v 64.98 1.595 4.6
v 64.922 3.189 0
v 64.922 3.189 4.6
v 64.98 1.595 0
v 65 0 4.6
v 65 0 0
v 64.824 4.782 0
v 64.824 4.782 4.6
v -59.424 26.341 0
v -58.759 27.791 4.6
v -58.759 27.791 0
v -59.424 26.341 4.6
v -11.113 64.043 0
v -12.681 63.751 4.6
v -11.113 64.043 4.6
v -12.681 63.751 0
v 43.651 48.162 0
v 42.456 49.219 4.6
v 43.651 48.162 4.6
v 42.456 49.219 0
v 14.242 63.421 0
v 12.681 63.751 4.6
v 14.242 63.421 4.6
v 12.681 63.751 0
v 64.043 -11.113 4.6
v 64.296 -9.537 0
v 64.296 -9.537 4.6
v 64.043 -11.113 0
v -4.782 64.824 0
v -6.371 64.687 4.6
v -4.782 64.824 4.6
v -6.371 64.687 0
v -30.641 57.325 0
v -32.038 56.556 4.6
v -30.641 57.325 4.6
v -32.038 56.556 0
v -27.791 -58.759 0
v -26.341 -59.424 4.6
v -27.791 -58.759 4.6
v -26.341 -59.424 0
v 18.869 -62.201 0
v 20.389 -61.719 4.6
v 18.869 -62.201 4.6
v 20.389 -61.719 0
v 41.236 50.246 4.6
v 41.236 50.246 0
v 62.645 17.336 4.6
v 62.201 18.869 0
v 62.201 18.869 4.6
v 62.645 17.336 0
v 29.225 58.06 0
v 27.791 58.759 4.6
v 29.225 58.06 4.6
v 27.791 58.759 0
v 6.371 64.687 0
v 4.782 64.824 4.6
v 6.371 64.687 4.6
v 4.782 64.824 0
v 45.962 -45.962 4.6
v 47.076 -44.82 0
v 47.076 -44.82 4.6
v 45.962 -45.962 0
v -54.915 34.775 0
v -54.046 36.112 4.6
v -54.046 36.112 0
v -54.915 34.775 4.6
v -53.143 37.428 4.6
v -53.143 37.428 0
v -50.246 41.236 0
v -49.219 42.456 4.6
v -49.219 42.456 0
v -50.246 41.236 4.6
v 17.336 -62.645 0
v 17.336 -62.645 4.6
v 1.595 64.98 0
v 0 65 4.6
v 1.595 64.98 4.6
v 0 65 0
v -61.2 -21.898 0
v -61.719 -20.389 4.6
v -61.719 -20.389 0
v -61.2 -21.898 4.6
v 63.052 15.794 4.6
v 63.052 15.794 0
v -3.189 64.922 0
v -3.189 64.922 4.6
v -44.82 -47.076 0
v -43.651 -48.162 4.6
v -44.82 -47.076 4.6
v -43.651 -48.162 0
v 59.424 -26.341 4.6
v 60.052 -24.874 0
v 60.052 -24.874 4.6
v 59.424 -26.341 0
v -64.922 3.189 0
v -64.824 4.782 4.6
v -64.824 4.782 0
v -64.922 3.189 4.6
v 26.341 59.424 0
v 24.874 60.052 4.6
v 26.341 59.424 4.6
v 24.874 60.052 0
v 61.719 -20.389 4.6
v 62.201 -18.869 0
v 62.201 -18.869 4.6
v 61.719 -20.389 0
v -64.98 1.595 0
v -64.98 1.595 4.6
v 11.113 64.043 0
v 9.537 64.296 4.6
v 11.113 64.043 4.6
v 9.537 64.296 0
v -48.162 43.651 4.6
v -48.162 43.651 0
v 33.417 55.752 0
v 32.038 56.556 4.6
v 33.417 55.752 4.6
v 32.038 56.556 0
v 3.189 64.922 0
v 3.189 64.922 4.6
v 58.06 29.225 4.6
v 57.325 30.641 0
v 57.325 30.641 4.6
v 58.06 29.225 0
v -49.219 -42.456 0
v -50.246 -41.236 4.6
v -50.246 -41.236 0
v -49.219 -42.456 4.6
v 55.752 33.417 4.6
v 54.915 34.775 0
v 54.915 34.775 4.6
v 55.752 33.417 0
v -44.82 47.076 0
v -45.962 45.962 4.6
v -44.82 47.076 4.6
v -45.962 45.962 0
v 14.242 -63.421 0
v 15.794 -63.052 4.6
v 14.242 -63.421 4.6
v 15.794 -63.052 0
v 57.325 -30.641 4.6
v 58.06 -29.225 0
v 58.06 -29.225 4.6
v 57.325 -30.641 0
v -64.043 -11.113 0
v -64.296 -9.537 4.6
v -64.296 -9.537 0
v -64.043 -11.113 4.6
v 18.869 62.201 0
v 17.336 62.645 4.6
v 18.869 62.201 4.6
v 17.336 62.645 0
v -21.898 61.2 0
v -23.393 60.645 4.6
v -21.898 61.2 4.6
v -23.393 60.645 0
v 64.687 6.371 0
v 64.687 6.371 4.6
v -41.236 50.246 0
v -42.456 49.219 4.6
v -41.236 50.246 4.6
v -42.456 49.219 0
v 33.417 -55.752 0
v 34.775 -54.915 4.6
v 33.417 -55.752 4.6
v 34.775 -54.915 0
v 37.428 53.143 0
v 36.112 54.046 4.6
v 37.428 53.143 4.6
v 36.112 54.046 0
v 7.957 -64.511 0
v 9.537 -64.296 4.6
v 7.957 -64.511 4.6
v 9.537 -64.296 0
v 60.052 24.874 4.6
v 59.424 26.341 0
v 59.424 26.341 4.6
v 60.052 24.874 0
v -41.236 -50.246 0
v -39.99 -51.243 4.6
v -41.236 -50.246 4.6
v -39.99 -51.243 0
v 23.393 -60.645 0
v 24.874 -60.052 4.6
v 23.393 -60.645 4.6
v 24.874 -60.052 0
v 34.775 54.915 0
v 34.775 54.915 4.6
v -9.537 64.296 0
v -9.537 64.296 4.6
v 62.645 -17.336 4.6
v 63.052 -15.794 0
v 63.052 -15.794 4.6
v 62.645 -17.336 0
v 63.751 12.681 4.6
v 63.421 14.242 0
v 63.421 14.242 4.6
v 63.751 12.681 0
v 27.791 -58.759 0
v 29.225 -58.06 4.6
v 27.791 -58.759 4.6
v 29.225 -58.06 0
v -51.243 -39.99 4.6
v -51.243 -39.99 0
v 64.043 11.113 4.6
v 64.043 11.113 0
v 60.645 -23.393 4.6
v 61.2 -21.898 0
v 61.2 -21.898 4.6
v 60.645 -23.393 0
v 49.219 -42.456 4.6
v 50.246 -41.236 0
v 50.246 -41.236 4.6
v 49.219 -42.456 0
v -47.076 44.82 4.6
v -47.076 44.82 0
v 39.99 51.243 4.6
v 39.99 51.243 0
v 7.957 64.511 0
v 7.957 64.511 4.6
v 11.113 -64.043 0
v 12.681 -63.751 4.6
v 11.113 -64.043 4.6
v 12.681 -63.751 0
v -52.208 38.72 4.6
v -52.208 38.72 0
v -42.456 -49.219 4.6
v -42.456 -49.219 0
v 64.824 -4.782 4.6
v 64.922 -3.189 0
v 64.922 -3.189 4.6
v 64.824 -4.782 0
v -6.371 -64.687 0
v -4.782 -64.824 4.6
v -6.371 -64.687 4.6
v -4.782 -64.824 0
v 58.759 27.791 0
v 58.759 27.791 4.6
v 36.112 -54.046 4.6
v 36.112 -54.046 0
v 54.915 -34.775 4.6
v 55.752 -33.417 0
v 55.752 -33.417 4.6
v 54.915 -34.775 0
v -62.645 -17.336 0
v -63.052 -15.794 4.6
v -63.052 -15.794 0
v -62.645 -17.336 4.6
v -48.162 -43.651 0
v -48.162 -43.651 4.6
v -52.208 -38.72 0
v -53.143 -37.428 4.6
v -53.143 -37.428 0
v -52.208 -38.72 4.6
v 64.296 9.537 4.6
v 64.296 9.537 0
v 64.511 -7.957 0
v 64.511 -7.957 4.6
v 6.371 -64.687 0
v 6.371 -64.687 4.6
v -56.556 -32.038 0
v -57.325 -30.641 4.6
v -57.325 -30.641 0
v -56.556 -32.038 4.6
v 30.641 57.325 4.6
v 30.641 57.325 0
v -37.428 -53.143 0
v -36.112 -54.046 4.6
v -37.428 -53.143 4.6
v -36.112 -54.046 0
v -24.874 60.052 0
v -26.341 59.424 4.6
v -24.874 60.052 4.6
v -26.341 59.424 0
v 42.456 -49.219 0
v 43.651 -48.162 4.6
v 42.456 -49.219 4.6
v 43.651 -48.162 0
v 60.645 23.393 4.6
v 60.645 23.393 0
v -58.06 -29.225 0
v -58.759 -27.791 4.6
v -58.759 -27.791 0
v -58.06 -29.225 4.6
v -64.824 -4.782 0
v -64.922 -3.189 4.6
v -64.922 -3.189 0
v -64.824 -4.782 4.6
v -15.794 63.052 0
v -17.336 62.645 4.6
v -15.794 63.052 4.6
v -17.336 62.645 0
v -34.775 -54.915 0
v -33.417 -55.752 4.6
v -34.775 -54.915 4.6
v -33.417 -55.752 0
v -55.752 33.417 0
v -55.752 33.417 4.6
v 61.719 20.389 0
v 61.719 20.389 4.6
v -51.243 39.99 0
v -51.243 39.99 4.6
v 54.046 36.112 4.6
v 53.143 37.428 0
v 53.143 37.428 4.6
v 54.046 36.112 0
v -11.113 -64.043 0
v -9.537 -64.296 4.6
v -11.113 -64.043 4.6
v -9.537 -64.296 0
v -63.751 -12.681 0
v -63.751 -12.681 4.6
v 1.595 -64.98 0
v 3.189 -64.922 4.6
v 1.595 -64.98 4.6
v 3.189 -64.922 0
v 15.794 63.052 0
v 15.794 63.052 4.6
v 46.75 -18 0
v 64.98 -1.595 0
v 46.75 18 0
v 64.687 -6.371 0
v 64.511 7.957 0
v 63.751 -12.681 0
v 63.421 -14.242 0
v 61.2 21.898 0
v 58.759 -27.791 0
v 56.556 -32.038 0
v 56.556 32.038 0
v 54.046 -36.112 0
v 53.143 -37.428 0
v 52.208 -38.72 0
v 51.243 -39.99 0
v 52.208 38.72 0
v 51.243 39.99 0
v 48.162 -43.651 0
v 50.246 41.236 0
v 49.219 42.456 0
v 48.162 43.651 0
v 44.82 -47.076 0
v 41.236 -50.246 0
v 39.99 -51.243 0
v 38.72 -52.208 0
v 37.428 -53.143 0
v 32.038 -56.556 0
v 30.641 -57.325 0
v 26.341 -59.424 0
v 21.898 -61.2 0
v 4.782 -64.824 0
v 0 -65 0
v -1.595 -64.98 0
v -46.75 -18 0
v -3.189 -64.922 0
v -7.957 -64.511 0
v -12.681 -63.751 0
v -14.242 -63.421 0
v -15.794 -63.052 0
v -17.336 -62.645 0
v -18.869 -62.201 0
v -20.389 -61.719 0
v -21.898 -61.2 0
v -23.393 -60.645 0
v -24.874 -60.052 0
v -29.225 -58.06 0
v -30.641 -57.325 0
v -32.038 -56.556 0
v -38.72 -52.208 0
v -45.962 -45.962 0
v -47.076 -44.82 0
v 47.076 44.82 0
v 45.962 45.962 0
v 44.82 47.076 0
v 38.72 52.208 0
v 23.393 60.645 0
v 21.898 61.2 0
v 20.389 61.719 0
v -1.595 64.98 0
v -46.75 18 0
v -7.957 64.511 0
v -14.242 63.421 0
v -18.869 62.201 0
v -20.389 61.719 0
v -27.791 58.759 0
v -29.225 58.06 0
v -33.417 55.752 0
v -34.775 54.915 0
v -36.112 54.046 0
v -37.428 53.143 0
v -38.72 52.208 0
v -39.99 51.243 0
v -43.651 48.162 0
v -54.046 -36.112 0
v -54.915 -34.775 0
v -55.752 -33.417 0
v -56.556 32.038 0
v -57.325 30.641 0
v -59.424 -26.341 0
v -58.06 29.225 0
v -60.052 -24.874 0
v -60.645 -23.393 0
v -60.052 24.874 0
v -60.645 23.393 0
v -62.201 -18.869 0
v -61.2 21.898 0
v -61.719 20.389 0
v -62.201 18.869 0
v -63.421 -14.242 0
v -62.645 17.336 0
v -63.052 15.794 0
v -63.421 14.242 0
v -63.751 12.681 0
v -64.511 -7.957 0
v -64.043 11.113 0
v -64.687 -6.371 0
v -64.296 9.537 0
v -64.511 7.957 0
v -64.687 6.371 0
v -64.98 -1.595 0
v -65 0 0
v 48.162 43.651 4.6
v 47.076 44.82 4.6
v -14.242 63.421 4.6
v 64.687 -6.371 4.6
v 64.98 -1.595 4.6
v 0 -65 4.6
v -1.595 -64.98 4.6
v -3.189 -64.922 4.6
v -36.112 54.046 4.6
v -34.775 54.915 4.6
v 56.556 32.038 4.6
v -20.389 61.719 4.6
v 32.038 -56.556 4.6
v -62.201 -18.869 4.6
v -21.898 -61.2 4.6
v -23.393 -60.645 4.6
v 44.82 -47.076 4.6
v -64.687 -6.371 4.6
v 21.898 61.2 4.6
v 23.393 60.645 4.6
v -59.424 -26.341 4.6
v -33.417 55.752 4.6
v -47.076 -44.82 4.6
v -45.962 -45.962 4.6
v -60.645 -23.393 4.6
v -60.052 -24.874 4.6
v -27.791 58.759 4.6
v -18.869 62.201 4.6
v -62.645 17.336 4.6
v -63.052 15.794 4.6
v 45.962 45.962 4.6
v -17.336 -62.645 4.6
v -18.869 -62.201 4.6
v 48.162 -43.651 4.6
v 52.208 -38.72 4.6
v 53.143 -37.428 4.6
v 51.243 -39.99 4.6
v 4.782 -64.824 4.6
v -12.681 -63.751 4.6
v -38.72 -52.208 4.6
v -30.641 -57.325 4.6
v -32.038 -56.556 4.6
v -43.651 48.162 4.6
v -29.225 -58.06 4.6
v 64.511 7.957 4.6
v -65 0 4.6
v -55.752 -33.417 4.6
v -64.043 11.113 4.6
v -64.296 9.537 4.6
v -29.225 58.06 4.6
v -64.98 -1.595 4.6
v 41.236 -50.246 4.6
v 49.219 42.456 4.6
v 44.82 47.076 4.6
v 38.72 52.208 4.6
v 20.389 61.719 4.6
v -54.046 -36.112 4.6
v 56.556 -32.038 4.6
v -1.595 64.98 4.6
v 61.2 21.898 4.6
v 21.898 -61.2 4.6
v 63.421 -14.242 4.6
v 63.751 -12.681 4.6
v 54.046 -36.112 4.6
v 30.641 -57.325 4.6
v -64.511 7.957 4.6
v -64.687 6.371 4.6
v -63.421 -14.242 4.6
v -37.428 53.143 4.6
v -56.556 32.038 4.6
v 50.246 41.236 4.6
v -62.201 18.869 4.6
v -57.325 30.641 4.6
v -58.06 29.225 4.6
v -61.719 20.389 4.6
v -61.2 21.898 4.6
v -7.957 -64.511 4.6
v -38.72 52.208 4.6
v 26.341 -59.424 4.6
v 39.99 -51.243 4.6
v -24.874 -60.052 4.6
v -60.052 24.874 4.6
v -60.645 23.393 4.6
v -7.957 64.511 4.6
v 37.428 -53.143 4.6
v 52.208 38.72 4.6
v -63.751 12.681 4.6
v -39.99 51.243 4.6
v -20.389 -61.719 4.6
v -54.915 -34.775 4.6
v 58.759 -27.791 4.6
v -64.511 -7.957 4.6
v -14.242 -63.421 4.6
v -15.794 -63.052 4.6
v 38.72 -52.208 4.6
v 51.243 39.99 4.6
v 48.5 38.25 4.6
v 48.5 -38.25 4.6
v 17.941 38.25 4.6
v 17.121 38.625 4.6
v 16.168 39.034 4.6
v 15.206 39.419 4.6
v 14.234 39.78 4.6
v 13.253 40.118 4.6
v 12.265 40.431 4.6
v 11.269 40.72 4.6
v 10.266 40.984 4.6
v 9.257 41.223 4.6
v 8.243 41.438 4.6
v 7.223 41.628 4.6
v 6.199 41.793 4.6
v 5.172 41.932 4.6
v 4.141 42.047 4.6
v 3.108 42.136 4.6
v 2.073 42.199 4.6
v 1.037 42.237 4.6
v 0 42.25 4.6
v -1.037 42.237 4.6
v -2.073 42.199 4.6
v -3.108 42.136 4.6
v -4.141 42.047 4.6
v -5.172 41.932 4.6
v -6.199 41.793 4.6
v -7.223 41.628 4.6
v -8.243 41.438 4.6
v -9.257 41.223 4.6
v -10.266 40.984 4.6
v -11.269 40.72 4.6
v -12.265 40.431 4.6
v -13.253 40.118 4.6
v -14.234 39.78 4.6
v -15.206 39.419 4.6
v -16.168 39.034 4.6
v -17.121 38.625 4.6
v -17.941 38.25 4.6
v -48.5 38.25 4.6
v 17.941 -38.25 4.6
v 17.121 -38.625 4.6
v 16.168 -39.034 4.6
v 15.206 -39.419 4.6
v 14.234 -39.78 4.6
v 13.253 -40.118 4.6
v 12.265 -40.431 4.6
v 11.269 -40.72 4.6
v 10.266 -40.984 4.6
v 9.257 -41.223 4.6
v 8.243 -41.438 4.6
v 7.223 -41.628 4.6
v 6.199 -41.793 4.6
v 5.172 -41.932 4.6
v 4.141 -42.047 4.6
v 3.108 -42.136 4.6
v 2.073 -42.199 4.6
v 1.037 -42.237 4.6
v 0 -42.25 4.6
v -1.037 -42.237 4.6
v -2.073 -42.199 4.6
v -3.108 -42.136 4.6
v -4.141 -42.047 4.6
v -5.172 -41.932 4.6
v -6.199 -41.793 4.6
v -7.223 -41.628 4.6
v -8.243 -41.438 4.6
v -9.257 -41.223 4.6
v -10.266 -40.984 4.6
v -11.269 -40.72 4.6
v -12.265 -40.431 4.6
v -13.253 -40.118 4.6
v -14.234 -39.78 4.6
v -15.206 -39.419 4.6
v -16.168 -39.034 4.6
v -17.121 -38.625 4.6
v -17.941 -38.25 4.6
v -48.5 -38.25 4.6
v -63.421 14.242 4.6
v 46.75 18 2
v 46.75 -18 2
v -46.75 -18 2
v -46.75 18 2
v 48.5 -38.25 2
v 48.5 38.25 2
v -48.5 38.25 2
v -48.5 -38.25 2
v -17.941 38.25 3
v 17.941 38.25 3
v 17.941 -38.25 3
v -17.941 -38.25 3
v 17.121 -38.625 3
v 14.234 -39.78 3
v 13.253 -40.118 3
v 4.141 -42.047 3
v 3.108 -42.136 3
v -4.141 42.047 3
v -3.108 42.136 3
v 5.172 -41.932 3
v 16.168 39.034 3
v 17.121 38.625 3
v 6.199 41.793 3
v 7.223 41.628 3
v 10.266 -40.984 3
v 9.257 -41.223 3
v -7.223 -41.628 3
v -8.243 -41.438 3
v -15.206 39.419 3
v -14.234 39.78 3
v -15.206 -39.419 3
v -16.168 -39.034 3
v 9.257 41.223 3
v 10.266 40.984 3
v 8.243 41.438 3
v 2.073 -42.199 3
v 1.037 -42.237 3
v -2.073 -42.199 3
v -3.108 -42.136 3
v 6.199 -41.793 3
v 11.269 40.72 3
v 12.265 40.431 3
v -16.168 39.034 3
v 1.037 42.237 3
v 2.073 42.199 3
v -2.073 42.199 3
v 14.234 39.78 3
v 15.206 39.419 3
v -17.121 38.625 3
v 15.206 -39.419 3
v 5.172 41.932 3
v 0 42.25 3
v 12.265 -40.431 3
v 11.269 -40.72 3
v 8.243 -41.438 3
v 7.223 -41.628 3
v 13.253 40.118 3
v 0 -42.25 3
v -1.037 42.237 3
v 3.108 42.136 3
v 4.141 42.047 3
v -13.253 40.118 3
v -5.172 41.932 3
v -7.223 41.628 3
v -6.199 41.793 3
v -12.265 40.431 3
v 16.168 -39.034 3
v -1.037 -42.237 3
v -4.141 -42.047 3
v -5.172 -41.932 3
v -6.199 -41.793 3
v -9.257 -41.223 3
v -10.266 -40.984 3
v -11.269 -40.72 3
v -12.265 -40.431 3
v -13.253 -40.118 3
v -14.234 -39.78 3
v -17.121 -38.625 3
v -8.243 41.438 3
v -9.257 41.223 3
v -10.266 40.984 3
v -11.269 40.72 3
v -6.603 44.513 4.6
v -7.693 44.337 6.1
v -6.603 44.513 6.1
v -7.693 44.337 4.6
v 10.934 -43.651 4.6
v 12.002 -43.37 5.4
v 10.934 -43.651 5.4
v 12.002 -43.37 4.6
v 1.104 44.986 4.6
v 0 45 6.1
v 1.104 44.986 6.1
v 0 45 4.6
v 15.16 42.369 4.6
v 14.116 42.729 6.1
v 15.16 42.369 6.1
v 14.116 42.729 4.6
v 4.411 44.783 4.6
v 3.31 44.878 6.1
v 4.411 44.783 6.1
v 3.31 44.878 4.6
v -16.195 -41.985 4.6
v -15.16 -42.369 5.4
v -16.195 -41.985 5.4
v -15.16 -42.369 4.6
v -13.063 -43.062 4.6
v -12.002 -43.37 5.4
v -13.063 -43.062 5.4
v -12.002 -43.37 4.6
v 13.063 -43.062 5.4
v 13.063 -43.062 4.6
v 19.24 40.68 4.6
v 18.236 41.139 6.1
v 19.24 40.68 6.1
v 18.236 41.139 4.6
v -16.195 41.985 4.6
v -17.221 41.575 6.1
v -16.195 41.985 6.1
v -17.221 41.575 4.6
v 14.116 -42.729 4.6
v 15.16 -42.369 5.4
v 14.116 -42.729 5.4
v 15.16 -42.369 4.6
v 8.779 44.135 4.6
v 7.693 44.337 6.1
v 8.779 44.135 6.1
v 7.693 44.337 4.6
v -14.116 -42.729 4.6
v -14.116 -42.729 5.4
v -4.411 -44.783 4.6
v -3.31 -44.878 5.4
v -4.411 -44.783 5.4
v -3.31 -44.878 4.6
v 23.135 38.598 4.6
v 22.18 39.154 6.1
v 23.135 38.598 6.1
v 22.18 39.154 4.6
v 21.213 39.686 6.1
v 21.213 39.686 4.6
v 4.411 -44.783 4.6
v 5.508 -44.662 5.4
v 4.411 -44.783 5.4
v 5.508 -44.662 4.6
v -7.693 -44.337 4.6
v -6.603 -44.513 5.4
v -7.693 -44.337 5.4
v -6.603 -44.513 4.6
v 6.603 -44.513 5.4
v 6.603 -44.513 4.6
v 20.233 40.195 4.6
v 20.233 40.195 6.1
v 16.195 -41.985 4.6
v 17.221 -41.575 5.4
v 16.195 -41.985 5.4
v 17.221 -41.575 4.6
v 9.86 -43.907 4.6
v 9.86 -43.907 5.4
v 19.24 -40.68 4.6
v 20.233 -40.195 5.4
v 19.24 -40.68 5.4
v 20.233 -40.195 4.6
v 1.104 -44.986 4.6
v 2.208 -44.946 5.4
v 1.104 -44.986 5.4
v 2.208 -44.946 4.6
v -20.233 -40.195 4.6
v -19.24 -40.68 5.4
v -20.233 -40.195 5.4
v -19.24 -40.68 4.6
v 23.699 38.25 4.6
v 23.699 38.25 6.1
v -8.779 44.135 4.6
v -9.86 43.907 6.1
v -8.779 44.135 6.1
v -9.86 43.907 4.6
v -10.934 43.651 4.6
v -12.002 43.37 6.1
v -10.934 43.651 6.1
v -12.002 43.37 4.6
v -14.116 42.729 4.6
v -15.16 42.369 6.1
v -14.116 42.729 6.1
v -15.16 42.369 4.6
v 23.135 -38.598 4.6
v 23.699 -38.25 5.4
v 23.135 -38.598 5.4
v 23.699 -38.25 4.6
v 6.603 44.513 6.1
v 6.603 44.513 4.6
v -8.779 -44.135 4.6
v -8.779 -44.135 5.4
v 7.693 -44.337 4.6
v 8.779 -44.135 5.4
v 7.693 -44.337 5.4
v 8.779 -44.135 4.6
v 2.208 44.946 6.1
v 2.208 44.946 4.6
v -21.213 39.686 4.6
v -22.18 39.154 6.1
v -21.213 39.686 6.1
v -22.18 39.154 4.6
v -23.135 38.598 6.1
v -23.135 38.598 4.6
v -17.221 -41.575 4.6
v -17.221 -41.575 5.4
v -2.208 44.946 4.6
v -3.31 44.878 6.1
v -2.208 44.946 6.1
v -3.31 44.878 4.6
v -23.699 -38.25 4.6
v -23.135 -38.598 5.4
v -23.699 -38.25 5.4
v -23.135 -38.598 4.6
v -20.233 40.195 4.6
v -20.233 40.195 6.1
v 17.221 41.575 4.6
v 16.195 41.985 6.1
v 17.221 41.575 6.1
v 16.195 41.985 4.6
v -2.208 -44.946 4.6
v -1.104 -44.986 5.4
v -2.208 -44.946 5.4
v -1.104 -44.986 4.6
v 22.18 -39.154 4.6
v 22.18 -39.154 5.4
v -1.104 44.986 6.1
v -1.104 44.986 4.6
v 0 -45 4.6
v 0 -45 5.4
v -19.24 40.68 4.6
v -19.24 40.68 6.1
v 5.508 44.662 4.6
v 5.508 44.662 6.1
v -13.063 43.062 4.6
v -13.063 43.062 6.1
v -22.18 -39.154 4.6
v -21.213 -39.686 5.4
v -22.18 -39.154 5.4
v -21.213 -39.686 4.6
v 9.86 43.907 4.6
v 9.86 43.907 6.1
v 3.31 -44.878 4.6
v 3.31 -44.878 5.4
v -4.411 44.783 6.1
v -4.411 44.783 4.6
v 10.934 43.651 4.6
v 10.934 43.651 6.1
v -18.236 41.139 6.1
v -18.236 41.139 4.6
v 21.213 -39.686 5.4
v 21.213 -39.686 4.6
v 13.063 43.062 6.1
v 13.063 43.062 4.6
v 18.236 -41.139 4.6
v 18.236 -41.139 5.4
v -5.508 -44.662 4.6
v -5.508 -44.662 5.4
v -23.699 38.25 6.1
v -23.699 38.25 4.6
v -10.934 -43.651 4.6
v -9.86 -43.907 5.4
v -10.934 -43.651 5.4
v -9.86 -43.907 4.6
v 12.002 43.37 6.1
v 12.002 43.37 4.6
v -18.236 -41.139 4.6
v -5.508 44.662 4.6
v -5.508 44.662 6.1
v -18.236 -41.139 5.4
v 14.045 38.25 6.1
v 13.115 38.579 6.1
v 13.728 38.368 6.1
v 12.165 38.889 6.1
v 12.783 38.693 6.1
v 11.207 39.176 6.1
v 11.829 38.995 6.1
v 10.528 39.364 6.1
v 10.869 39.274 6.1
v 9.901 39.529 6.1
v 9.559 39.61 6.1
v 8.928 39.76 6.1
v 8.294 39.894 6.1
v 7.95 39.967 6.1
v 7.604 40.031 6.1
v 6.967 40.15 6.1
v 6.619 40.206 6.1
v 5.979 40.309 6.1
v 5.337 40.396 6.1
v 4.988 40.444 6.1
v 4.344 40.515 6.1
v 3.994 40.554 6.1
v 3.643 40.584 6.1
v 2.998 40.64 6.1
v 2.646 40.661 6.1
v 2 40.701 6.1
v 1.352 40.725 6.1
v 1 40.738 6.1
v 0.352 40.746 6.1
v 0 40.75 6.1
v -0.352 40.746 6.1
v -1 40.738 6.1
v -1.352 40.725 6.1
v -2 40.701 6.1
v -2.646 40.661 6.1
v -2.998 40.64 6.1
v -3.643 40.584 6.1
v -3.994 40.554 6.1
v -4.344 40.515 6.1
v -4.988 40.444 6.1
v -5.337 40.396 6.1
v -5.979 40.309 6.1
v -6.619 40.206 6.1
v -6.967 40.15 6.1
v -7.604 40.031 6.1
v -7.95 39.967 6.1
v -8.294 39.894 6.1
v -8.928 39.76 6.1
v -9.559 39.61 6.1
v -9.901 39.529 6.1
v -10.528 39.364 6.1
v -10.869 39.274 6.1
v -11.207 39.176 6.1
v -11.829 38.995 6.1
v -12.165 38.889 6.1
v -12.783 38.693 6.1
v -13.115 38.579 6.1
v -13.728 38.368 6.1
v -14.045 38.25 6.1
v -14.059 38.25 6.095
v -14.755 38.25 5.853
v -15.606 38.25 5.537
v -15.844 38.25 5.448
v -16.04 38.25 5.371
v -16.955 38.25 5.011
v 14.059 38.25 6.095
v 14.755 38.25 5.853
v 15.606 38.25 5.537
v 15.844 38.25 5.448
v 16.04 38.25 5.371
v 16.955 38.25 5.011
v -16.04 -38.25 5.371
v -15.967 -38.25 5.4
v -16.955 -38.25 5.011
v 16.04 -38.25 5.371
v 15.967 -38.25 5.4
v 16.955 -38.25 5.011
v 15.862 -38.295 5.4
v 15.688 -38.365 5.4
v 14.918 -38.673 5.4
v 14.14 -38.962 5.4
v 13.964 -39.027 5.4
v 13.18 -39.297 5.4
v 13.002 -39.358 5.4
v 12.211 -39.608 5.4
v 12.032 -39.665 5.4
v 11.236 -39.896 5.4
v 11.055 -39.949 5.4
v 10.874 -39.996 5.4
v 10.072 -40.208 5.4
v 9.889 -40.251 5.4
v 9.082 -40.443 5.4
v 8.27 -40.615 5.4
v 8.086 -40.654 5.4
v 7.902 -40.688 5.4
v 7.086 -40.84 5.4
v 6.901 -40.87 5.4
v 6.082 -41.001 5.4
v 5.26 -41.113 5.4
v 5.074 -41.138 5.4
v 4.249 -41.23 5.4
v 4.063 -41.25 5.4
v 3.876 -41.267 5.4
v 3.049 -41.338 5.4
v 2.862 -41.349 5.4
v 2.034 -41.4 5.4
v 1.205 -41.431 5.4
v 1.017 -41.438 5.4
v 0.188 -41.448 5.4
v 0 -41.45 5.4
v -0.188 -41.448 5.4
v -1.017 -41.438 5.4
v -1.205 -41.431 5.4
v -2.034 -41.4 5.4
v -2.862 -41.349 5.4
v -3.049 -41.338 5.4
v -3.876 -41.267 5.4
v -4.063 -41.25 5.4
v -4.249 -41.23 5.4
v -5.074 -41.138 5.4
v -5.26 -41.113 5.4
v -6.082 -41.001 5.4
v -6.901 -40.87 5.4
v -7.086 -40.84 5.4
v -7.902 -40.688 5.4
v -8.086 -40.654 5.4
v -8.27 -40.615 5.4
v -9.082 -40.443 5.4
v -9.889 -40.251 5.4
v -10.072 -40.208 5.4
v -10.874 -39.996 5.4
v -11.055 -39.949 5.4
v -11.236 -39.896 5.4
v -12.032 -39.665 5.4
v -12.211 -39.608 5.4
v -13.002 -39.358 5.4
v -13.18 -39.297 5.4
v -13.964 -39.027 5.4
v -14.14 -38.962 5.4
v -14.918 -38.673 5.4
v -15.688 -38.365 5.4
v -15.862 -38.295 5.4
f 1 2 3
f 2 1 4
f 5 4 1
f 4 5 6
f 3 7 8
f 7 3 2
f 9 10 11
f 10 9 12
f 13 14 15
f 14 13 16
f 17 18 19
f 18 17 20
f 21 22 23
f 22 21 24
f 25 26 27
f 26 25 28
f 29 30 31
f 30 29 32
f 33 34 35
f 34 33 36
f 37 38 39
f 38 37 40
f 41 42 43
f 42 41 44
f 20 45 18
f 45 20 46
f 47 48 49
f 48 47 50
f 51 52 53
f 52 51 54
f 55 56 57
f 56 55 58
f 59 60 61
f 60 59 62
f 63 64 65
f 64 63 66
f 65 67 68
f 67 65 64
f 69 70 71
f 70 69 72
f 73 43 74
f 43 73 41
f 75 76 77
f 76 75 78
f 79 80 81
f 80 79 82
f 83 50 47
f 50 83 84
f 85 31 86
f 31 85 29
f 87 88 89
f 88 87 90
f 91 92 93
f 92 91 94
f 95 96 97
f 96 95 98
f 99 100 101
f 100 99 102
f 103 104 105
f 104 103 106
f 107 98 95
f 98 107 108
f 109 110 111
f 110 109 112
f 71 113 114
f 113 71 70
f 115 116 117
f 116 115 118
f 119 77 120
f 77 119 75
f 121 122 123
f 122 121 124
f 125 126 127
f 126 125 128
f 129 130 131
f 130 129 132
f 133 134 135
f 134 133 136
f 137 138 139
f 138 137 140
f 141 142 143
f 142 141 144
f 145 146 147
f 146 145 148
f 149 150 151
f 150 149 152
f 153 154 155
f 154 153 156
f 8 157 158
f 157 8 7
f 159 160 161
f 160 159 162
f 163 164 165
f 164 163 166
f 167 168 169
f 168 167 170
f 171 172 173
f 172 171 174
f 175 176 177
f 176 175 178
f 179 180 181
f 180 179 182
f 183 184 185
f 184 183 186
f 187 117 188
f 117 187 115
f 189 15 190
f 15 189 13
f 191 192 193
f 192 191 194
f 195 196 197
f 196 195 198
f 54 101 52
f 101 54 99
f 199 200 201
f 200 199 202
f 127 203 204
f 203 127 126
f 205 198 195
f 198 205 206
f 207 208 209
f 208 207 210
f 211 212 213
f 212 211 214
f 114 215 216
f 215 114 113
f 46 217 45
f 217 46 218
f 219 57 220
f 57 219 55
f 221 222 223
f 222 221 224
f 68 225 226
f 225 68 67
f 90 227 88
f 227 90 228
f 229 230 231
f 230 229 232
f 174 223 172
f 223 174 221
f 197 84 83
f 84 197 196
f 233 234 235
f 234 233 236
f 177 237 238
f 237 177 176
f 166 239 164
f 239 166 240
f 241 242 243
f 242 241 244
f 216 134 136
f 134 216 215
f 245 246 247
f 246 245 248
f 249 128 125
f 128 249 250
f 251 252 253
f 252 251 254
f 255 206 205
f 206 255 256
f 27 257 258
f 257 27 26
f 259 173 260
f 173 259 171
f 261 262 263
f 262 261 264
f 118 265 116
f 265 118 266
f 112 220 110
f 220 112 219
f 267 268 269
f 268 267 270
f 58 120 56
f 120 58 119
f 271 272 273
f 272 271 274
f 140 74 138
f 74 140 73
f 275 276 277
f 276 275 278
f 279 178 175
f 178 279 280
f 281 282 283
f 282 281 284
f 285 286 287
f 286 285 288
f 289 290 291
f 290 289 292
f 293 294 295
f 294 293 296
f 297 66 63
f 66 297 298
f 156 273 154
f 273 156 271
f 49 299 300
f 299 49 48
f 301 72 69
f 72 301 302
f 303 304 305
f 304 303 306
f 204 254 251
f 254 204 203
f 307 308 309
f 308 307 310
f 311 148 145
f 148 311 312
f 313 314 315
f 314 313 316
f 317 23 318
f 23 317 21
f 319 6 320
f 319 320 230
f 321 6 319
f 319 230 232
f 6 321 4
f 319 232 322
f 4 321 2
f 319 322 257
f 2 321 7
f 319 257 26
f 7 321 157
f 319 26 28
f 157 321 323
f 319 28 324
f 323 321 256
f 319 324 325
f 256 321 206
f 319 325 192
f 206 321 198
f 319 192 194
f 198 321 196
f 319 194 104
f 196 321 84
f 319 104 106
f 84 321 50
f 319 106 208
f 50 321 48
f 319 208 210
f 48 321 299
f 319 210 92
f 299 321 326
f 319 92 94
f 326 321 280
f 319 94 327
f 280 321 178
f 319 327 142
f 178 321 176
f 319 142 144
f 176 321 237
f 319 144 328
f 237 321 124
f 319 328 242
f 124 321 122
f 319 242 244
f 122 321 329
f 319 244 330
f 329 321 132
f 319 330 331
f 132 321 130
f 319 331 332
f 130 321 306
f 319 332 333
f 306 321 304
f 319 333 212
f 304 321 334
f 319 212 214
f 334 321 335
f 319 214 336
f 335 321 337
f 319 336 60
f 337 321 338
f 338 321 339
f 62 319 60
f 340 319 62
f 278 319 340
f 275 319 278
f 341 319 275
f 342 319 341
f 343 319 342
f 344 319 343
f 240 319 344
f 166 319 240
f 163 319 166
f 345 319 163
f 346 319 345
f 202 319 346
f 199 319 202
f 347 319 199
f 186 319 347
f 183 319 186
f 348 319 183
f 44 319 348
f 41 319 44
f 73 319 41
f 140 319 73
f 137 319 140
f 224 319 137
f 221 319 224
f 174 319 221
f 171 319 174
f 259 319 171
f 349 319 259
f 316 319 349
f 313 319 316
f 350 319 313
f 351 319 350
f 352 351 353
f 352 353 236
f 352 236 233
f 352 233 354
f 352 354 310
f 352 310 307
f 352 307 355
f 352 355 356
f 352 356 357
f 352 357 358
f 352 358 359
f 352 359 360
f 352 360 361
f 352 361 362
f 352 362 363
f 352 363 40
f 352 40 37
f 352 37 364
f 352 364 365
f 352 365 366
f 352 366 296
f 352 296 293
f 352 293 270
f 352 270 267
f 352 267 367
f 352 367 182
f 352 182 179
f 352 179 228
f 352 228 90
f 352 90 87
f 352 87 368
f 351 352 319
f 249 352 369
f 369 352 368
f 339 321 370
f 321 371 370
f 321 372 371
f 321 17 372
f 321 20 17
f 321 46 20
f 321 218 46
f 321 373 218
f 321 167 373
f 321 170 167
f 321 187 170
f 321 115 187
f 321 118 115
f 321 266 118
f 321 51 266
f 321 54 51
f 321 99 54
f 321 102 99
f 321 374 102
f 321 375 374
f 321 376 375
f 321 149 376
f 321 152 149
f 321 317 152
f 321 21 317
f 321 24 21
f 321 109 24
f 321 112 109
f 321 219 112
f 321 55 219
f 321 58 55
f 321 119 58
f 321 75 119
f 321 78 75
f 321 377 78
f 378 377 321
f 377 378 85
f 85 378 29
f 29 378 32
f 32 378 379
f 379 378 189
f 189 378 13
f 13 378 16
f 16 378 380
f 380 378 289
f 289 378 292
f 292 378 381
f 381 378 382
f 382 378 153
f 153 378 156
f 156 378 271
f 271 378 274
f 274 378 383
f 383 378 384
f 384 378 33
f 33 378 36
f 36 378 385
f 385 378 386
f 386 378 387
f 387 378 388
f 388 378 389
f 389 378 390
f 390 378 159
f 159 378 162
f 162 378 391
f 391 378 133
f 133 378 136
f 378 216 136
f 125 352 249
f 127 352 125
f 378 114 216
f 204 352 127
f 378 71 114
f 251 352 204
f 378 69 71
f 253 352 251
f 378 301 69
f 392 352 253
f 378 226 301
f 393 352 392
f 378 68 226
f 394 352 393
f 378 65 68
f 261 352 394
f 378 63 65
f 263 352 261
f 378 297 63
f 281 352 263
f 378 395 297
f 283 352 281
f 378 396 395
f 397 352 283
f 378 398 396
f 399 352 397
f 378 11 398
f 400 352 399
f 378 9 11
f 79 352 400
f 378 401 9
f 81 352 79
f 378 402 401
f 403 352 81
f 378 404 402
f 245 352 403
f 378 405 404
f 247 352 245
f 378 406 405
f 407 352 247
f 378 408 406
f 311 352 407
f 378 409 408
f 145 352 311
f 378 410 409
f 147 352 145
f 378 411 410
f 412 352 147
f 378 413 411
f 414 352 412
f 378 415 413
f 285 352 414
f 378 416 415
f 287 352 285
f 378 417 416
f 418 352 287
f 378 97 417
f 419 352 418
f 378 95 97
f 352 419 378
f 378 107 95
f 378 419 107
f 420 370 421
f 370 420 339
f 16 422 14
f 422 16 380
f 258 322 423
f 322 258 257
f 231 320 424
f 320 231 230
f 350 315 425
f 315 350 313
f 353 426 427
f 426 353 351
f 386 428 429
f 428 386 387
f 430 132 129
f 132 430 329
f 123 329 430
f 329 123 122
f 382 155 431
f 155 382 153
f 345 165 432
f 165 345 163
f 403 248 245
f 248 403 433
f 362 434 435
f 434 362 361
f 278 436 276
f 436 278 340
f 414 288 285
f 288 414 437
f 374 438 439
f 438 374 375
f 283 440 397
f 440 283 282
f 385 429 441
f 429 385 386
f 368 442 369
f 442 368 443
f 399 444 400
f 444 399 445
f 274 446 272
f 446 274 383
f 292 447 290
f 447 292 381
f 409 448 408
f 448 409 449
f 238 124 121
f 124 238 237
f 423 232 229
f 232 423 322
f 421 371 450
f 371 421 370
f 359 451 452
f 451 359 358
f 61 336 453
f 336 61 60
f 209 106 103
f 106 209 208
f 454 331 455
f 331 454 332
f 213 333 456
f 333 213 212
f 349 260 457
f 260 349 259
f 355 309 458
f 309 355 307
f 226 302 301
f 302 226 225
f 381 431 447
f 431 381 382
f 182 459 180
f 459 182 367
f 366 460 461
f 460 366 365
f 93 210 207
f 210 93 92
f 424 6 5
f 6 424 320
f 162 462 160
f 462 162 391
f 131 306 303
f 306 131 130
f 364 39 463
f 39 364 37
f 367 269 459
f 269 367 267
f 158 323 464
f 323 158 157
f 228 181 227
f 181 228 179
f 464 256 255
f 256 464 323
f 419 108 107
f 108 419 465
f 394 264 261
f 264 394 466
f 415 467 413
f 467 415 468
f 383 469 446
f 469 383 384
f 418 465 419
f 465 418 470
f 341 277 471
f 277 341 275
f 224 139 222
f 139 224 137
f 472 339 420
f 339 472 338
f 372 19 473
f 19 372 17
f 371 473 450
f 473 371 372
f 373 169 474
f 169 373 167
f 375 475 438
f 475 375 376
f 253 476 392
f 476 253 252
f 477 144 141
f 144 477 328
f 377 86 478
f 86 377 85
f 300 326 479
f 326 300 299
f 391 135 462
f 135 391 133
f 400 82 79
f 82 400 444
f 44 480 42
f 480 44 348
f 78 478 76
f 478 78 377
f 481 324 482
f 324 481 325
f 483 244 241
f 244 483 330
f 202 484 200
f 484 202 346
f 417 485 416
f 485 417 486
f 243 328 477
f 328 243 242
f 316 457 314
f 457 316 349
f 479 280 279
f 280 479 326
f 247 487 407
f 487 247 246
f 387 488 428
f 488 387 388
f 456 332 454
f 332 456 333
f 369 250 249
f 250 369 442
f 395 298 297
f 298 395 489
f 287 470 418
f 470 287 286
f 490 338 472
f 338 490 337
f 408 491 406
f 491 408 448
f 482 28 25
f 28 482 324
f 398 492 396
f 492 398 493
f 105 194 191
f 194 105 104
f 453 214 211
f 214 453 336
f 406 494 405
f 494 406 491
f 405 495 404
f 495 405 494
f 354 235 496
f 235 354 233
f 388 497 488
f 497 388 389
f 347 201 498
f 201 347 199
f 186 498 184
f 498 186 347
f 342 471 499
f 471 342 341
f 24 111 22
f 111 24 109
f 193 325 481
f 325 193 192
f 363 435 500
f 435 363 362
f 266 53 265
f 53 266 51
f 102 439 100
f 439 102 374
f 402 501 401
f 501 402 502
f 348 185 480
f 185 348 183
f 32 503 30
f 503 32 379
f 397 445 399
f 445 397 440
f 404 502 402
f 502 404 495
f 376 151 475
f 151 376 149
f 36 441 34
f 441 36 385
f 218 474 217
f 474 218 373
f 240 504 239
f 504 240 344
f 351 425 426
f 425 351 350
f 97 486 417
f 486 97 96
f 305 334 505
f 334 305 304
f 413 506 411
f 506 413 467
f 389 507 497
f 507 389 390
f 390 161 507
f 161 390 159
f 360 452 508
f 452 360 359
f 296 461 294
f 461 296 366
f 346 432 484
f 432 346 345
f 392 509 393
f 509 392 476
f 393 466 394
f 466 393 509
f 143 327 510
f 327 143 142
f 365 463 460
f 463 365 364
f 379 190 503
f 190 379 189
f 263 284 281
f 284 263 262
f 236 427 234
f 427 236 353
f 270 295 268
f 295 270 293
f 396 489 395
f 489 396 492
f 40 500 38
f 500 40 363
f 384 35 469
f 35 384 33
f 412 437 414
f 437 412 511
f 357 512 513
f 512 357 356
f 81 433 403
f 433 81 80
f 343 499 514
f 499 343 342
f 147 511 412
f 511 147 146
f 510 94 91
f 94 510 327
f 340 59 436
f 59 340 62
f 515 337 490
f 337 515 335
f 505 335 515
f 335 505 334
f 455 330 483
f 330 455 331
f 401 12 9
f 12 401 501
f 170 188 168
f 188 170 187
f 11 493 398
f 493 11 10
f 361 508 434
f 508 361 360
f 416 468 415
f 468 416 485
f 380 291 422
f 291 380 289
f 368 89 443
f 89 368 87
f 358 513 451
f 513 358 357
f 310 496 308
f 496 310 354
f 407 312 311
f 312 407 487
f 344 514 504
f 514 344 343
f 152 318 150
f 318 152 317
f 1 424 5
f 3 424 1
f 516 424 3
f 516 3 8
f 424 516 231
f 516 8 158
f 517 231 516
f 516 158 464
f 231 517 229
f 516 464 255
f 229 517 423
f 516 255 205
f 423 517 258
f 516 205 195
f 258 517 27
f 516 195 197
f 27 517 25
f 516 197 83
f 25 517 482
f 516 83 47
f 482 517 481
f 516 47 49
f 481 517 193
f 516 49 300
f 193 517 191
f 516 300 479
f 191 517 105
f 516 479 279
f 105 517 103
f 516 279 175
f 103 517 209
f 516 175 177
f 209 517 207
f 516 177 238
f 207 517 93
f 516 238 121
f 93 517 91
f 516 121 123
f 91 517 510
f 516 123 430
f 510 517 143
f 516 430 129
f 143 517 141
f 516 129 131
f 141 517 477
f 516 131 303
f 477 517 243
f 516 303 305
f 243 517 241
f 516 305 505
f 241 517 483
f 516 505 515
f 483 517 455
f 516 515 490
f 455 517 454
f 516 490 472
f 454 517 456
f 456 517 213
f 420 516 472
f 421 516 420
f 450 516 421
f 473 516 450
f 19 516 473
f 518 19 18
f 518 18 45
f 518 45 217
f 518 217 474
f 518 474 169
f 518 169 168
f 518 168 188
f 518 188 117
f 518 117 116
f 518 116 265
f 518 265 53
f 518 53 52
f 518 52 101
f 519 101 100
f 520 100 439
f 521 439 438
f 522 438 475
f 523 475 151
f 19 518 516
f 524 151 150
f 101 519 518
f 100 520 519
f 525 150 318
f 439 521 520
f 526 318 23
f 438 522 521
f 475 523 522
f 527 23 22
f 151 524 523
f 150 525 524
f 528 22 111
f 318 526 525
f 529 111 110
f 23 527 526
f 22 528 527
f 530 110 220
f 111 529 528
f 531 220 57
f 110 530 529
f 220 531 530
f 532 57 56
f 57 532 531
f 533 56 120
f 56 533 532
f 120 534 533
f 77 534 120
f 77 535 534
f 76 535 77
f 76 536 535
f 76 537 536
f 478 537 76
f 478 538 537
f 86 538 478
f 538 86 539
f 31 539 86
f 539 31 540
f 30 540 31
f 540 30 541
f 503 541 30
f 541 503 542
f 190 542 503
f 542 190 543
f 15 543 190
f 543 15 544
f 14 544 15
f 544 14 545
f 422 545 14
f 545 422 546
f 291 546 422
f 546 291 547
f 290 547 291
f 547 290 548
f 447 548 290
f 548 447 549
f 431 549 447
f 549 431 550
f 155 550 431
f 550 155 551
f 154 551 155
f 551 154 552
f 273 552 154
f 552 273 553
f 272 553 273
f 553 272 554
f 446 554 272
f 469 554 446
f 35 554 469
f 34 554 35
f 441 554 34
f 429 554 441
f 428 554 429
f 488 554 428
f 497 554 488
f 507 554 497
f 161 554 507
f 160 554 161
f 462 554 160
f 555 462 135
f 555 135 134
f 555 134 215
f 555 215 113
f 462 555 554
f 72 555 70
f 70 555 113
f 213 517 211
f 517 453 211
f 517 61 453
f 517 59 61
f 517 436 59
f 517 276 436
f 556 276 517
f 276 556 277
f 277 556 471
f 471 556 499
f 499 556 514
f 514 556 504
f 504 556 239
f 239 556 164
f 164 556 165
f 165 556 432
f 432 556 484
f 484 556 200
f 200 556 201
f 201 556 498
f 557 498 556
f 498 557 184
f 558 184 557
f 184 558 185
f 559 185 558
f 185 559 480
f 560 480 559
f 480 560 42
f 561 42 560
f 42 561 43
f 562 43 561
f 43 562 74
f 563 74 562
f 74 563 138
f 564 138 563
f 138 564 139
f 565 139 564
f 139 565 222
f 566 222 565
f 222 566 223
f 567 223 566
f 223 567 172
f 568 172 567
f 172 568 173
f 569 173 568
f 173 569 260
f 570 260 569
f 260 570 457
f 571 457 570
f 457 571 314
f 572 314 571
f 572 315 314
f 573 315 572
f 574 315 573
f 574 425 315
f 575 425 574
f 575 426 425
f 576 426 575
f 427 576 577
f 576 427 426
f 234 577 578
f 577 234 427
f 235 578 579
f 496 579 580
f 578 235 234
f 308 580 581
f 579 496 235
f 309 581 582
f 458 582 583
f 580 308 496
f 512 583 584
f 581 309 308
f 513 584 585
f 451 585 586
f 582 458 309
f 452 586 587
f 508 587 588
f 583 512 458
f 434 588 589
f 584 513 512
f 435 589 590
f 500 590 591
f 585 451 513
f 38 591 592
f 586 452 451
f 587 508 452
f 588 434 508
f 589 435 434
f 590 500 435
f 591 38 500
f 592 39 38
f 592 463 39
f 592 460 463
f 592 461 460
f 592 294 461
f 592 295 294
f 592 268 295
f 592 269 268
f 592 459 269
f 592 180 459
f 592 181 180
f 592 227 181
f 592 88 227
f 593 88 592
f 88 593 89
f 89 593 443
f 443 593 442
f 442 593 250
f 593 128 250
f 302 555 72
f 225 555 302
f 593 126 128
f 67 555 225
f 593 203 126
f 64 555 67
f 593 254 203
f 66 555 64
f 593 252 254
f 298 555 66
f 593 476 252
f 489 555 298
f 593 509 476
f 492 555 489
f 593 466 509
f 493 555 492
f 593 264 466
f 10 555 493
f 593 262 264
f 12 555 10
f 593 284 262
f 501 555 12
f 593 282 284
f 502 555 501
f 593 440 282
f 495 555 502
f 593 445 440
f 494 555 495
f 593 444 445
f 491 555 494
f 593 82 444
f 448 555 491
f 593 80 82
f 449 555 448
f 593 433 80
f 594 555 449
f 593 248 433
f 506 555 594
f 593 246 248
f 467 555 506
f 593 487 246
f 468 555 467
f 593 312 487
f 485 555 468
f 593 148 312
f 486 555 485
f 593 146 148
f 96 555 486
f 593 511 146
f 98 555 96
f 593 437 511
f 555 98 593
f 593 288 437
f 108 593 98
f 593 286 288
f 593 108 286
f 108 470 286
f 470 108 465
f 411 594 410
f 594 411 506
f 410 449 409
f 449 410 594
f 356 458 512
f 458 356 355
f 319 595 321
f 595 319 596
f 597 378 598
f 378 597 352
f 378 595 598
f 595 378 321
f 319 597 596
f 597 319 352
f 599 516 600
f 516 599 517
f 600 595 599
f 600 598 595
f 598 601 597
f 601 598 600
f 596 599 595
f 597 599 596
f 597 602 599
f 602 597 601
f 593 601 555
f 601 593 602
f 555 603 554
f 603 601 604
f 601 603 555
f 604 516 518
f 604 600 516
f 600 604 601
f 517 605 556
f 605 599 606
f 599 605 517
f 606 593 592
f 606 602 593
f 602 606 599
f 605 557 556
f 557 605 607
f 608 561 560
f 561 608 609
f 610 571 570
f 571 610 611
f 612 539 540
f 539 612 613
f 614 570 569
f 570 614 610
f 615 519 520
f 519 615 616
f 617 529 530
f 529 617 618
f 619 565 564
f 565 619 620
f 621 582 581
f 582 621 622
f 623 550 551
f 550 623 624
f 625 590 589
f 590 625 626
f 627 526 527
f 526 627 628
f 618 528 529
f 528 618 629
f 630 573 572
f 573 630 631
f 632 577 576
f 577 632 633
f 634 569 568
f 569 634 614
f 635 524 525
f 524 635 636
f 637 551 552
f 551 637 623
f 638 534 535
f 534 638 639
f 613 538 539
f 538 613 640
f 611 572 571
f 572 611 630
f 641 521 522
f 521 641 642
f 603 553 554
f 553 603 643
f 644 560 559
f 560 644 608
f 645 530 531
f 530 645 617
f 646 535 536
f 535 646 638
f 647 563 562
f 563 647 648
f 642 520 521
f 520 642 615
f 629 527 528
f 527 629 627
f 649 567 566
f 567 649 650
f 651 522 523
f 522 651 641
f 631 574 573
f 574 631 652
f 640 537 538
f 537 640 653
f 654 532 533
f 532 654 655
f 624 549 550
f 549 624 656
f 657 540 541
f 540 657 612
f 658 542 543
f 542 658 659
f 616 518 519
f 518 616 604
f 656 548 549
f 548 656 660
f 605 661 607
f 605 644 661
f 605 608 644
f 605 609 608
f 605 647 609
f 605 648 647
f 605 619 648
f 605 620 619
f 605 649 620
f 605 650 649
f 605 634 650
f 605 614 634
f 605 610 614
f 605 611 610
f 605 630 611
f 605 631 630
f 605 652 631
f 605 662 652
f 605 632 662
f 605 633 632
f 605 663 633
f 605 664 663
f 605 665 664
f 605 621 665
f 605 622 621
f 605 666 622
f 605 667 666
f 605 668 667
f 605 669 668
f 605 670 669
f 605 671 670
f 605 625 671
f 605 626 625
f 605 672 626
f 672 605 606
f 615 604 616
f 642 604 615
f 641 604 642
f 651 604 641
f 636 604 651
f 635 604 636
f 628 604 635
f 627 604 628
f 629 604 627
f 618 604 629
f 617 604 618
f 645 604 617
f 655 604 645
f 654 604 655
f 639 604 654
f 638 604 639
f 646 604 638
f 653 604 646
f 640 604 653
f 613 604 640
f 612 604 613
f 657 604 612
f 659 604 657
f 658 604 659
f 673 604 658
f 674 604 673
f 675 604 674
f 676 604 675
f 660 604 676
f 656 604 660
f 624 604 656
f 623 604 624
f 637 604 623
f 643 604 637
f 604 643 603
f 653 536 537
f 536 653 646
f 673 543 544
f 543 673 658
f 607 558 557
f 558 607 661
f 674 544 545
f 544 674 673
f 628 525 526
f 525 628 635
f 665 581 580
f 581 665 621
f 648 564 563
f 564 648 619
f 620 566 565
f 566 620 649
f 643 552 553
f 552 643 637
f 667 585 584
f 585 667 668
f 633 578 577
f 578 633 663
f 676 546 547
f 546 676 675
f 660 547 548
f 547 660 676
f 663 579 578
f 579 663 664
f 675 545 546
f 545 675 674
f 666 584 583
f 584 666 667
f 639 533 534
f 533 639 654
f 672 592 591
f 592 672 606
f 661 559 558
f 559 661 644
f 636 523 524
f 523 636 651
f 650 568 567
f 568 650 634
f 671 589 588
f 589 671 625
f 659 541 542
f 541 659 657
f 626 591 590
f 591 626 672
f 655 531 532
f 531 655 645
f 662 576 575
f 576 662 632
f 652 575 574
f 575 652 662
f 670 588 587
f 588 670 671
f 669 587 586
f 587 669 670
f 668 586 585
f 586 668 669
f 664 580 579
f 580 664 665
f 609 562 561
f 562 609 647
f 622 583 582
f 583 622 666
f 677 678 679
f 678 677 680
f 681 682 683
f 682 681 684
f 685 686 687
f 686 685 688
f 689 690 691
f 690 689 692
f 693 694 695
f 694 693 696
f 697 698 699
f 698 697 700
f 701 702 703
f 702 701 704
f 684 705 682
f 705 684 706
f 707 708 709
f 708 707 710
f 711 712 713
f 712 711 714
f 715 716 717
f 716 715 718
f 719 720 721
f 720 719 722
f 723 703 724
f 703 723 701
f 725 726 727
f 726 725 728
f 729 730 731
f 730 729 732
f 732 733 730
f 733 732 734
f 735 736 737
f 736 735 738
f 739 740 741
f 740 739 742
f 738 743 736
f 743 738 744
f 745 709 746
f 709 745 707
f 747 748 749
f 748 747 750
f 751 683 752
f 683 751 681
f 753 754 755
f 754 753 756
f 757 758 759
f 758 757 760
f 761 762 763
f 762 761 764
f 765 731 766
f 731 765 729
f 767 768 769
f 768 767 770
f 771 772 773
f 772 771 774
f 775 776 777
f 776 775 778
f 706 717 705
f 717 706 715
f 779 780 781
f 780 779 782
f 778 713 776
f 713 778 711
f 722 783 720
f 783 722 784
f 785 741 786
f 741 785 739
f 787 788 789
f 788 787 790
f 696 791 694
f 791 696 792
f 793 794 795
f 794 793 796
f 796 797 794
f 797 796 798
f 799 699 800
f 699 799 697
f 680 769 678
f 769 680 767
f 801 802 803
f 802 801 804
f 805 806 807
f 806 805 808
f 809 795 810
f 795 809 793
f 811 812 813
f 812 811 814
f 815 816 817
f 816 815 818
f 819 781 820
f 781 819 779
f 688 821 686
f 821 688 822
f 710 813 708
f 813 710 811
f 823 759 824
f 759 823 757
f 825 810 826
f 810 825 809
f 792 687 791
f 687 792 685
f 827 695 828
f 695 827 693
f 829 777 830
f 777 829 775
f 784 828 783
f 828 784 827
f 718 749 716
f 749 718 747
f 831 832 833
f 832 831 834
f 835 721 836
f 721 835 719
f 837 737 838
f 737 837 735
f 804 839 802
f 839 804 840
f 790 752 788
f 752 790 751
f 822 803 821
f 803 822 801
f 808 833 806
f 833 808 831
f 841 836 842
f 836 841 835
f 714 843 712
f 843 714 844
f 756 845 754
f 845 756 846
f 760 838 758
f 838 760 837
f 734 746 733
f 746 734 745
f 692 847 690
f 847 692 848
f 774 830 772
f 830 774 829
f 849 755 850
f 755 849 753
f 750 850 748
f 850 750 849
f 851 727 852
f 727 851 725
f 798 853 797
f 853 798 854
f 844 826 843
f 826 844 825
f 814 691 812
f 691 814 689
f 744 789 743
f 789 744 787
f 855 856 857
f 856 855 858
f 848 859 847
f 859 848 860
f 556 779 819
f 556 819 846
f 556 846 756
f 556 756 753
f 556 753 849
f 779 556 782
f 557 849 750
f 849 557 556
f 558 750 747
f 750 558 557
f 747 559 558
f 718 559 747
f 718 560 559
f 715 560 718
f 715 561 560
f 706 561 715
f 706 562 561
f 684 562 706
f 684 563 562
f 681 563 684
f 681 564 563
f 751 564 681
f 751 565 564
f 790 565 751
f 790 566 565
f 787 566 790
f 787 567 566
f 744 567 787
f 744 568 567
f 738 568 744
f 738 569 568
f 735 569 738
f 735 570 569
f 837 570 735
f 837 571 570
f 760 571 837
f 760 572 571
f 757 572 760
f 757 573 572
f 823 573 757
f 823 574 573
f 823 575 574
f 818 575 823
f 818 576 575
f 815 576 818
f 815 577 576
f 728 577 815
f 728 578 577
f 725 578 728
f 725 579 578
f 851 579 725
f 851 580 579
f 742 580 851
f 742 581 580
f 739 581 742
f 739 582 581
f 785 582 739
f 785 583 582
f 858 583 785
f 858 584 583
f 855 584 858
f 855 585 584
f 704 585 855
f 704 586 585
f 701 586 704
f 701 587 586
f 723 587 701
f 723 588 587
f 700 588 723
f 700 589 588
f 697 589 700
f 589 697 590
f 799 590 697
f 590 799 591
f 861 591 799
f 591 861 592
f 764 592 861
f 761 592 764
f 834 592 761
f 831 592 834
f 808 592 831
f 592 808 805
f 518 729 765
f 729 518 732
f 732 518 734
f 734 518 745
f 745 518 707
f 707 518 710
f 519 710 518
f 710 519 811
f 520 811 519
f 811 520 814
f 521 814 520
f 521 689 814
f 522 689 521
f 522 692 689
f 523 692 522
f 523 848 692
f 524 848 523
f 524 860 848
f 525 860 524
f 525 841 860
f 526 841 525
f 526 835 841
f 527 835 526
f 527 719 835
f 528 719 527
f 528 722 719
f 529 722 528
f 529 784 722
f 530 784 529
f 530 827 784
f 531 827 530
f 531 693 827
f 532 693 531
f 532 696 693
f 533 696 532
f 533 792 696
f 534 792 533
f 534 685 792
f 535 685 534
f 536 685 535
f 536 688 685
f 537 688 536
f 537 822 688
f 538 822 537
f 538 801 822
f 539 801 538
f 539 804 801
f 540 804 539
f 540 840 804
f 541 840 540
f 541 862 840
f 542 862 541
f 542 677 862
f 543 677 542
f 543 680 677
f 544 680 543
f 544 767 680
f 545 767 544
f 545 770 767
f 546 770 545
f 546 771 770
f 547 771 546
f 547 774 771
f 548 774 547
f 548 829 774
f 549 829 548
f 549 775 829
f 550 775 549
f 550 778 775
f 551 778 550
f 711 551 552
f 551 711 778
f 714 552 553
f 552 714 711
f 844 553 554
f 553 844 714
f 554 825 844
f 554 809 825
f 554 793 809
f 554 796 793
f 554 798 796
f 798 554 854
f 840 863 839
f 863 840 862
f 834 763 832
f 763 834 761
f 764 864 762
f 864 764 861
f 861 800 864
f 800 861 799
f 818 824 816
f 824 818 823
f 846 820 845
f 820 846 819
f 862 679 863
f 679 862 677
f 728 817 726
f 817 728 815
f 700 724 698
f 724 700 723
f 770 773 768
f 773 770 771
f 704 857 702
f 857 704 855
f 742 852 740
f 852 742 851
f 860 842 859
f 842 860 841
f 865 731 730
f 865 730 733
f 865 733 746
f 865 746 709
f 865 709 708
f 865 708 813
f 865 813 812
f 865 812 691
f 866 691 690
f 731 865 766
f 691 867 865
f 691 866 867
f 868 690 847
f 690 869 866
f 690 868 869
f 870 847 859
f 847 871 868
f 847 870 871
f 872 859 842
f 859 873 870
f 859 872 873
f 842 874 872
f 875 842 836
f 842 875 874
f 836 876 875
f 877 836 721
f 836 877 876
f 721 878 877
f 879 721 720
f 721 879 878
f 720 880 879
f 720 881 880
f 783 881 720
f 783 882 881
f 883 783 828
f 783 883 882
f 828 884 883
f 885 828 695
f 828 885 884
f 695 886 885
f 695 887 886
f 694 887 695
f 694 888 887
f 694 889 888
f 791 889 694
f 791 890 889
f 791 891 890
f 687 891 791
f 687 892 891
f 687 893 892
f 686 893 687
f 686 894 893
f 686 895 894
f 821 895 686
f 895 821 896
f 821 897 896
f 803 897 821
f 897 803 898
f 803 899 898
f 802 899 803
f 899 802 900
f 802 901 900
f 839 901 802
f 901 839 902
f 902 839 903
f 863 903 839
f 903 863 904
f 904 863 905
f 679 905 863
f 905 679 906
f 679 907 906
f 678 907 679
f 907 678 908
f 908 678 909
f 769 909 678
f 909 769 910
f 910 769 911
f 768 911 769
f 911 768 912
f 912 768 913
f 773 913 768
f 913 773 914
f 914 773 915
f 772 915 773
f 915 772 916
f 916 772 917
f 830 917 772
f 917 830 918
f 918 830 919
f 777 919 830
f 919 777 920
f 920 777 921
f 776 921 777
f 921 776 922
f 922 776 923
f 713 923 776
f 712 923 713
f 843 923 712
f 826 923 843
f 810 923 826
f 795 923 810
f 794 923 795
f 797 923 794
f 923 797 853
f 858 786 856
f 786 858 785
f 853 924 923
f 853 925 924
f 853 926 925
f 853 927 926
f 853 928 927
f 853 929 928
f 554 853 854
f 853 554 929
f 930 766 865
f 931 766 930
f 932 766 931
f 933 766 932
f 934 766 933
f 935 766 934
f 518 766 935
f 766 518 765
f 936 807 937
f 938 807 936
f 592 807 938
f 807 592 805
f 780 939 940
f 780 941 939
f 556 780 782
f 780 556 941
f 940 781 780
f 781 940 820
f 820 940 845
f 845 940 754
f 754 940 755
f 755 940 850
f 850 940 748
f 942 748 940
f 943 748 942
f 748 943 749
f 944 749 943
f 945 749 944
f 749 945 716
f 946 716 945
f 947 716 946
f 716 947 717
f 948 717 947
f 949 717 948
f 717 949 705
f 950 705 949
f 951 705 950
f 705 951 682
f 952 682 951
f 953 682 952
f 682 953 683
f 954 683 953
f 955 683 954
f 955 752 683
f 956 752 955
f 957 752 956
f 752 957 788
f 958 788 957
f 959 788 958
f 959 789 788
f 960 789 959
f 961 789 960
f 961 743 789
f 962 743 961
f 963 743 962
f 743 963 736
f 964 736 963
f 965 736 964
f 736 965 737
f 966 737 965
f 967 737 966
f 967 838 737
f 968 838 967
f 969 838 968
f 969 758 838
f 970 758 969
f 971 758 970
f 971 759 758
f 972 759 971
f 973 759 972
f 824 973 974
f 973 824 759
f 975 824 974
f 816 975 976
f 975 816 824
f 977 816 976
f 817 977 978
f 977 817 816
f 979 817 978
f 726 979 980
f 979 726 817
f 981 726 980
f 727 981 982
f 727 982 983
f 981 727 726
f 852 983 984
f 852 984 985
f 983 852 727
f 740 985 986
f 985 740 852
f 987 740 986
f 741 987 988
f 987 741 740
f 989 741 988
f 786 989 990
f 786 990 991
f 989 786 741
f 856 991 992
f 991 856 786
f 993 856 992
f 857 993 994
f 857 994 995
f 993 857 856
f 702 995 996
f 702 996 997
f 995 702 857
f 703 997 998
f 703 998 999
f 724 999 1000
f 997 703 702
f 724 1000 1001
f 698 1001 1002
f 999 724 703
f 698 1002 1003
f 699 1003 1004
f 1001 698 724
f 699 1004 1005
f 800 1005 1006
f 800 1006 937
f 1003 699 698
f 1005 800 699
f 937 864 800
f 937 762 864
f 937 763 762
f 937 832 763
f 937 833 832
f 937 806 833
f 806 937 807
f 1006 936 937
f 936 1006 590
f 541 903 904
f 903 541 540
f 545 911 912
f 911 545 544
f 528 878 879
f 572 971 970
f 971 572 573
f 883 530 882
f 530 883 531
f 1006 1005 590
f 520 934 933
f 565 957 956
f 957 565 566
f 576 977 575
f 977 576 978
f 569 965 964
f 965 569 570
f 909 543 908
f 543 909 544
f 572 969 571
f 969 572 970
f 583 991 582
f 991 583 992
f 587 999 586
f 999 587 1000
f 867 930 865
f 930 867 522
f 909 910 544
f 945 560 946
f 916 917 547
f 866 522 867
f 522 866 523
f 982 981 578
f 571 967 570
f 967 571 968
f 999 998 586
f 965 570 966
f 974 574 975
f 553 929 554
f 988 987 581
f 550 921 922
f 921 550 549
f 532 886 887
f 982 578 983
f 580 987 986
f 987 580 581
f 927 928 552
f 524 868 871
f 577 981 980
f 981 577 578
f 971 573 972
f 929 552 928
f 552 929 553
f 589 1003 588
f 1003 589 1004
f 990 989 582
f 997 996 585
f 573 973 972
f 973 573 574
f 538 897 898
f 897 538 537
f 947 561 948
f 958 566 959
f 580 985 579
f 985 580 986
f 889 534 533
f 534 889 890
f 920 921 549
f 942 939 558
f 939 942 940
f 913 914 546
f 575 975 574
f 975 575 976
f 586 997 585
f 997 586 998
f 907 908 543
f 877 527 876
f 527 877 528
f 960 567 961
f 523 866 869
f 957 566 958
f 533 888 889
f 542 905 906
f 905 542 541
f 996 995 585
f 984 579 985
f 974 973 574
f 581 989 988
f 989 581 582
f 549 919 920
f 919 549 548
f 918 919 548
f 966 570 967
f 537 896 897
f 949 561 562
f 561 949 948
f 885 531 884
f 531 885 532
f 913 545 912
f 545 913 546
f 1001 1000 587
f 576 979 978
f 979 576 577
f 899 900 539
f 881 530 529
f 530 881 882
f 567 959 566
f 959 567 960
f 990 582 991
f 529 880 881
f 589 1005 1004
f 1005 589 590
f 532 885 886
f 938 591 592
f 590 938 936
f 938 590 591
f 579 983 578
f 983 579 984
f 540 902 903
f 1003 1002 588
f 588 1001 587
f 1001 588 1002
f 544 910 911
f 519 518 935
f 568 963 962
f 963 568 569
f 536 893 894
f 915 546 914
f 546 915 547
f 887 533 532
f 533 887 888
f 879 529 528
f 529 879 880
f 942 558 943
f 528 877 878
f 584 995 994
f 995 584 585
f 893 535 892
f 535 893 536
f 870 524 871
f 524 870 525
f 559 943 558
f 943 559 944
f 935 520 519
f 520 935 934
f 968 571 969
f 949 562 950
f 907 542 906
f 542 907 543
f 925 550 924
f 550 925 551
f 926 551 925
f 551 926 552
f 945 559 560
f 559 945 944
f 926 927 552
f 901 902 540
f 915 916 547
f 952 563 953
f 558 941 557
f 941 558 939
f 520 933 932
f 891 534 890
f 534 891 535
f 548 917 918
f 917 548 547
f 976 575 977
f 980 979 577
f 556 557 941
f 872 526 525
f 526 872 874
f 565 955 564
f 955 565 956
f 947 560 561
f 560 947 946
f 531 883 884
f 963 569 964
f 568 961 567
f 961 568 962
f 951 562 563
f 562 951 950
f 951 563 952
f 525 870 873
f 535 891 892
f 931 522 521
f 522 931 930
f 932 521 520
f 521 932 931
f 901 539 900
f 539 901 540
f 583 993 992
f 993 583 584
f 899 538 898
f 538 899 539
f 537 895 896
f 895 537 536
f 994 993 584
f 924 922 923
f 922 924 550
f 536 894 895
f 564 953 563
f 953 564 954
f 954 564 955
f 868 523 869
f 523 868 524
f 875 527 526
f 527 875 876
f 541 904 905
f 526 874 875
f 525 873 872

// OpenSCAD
W=36;
H=36;

difference() {
cylinder(d=130,h=4.6,$fn=256);
cube_center([95.5-2.0,36,4]);

translate([0,0,2])
cube_center([96.5+.5,2*38.0+.5,4]);

translate([0,0,3])
cylinder(d=84.5,h=4,$fn=256);
}

//for(i=[0,90])
//rotate([0,0,i])
translate([0,0,4.6])
difference() {

    intersection() {
        cylinder(d=90,h=1.5,$fn=256);
     }   
        cube_center([96.5+.5,2*38.0+.5,4]);
        
        translate([0,-10,.8])
        cube_center([96.5+.5,2*38.0+.5,4]);
        
        
    cylinder(d1=84.5,d2=76.5,h=4,$fn=256);
    
}


//84

module cube_center(dims,r=0,$fn=16) {
    if(r==0) {
        translate([-dims[0]/2, -dims[1]/2, 0])
        cube(dims);
    } else {
        minkowski() {
            translate([-(dims[0]-2*r)/2, -(dims[1]-2*r)/2, 0])
            cube([dims[0]-2*r,dims[1]-2*r,dims[2]]);
            cylinder(r=r,$fn=$fn,h=0.0001);
        }
    }
}
